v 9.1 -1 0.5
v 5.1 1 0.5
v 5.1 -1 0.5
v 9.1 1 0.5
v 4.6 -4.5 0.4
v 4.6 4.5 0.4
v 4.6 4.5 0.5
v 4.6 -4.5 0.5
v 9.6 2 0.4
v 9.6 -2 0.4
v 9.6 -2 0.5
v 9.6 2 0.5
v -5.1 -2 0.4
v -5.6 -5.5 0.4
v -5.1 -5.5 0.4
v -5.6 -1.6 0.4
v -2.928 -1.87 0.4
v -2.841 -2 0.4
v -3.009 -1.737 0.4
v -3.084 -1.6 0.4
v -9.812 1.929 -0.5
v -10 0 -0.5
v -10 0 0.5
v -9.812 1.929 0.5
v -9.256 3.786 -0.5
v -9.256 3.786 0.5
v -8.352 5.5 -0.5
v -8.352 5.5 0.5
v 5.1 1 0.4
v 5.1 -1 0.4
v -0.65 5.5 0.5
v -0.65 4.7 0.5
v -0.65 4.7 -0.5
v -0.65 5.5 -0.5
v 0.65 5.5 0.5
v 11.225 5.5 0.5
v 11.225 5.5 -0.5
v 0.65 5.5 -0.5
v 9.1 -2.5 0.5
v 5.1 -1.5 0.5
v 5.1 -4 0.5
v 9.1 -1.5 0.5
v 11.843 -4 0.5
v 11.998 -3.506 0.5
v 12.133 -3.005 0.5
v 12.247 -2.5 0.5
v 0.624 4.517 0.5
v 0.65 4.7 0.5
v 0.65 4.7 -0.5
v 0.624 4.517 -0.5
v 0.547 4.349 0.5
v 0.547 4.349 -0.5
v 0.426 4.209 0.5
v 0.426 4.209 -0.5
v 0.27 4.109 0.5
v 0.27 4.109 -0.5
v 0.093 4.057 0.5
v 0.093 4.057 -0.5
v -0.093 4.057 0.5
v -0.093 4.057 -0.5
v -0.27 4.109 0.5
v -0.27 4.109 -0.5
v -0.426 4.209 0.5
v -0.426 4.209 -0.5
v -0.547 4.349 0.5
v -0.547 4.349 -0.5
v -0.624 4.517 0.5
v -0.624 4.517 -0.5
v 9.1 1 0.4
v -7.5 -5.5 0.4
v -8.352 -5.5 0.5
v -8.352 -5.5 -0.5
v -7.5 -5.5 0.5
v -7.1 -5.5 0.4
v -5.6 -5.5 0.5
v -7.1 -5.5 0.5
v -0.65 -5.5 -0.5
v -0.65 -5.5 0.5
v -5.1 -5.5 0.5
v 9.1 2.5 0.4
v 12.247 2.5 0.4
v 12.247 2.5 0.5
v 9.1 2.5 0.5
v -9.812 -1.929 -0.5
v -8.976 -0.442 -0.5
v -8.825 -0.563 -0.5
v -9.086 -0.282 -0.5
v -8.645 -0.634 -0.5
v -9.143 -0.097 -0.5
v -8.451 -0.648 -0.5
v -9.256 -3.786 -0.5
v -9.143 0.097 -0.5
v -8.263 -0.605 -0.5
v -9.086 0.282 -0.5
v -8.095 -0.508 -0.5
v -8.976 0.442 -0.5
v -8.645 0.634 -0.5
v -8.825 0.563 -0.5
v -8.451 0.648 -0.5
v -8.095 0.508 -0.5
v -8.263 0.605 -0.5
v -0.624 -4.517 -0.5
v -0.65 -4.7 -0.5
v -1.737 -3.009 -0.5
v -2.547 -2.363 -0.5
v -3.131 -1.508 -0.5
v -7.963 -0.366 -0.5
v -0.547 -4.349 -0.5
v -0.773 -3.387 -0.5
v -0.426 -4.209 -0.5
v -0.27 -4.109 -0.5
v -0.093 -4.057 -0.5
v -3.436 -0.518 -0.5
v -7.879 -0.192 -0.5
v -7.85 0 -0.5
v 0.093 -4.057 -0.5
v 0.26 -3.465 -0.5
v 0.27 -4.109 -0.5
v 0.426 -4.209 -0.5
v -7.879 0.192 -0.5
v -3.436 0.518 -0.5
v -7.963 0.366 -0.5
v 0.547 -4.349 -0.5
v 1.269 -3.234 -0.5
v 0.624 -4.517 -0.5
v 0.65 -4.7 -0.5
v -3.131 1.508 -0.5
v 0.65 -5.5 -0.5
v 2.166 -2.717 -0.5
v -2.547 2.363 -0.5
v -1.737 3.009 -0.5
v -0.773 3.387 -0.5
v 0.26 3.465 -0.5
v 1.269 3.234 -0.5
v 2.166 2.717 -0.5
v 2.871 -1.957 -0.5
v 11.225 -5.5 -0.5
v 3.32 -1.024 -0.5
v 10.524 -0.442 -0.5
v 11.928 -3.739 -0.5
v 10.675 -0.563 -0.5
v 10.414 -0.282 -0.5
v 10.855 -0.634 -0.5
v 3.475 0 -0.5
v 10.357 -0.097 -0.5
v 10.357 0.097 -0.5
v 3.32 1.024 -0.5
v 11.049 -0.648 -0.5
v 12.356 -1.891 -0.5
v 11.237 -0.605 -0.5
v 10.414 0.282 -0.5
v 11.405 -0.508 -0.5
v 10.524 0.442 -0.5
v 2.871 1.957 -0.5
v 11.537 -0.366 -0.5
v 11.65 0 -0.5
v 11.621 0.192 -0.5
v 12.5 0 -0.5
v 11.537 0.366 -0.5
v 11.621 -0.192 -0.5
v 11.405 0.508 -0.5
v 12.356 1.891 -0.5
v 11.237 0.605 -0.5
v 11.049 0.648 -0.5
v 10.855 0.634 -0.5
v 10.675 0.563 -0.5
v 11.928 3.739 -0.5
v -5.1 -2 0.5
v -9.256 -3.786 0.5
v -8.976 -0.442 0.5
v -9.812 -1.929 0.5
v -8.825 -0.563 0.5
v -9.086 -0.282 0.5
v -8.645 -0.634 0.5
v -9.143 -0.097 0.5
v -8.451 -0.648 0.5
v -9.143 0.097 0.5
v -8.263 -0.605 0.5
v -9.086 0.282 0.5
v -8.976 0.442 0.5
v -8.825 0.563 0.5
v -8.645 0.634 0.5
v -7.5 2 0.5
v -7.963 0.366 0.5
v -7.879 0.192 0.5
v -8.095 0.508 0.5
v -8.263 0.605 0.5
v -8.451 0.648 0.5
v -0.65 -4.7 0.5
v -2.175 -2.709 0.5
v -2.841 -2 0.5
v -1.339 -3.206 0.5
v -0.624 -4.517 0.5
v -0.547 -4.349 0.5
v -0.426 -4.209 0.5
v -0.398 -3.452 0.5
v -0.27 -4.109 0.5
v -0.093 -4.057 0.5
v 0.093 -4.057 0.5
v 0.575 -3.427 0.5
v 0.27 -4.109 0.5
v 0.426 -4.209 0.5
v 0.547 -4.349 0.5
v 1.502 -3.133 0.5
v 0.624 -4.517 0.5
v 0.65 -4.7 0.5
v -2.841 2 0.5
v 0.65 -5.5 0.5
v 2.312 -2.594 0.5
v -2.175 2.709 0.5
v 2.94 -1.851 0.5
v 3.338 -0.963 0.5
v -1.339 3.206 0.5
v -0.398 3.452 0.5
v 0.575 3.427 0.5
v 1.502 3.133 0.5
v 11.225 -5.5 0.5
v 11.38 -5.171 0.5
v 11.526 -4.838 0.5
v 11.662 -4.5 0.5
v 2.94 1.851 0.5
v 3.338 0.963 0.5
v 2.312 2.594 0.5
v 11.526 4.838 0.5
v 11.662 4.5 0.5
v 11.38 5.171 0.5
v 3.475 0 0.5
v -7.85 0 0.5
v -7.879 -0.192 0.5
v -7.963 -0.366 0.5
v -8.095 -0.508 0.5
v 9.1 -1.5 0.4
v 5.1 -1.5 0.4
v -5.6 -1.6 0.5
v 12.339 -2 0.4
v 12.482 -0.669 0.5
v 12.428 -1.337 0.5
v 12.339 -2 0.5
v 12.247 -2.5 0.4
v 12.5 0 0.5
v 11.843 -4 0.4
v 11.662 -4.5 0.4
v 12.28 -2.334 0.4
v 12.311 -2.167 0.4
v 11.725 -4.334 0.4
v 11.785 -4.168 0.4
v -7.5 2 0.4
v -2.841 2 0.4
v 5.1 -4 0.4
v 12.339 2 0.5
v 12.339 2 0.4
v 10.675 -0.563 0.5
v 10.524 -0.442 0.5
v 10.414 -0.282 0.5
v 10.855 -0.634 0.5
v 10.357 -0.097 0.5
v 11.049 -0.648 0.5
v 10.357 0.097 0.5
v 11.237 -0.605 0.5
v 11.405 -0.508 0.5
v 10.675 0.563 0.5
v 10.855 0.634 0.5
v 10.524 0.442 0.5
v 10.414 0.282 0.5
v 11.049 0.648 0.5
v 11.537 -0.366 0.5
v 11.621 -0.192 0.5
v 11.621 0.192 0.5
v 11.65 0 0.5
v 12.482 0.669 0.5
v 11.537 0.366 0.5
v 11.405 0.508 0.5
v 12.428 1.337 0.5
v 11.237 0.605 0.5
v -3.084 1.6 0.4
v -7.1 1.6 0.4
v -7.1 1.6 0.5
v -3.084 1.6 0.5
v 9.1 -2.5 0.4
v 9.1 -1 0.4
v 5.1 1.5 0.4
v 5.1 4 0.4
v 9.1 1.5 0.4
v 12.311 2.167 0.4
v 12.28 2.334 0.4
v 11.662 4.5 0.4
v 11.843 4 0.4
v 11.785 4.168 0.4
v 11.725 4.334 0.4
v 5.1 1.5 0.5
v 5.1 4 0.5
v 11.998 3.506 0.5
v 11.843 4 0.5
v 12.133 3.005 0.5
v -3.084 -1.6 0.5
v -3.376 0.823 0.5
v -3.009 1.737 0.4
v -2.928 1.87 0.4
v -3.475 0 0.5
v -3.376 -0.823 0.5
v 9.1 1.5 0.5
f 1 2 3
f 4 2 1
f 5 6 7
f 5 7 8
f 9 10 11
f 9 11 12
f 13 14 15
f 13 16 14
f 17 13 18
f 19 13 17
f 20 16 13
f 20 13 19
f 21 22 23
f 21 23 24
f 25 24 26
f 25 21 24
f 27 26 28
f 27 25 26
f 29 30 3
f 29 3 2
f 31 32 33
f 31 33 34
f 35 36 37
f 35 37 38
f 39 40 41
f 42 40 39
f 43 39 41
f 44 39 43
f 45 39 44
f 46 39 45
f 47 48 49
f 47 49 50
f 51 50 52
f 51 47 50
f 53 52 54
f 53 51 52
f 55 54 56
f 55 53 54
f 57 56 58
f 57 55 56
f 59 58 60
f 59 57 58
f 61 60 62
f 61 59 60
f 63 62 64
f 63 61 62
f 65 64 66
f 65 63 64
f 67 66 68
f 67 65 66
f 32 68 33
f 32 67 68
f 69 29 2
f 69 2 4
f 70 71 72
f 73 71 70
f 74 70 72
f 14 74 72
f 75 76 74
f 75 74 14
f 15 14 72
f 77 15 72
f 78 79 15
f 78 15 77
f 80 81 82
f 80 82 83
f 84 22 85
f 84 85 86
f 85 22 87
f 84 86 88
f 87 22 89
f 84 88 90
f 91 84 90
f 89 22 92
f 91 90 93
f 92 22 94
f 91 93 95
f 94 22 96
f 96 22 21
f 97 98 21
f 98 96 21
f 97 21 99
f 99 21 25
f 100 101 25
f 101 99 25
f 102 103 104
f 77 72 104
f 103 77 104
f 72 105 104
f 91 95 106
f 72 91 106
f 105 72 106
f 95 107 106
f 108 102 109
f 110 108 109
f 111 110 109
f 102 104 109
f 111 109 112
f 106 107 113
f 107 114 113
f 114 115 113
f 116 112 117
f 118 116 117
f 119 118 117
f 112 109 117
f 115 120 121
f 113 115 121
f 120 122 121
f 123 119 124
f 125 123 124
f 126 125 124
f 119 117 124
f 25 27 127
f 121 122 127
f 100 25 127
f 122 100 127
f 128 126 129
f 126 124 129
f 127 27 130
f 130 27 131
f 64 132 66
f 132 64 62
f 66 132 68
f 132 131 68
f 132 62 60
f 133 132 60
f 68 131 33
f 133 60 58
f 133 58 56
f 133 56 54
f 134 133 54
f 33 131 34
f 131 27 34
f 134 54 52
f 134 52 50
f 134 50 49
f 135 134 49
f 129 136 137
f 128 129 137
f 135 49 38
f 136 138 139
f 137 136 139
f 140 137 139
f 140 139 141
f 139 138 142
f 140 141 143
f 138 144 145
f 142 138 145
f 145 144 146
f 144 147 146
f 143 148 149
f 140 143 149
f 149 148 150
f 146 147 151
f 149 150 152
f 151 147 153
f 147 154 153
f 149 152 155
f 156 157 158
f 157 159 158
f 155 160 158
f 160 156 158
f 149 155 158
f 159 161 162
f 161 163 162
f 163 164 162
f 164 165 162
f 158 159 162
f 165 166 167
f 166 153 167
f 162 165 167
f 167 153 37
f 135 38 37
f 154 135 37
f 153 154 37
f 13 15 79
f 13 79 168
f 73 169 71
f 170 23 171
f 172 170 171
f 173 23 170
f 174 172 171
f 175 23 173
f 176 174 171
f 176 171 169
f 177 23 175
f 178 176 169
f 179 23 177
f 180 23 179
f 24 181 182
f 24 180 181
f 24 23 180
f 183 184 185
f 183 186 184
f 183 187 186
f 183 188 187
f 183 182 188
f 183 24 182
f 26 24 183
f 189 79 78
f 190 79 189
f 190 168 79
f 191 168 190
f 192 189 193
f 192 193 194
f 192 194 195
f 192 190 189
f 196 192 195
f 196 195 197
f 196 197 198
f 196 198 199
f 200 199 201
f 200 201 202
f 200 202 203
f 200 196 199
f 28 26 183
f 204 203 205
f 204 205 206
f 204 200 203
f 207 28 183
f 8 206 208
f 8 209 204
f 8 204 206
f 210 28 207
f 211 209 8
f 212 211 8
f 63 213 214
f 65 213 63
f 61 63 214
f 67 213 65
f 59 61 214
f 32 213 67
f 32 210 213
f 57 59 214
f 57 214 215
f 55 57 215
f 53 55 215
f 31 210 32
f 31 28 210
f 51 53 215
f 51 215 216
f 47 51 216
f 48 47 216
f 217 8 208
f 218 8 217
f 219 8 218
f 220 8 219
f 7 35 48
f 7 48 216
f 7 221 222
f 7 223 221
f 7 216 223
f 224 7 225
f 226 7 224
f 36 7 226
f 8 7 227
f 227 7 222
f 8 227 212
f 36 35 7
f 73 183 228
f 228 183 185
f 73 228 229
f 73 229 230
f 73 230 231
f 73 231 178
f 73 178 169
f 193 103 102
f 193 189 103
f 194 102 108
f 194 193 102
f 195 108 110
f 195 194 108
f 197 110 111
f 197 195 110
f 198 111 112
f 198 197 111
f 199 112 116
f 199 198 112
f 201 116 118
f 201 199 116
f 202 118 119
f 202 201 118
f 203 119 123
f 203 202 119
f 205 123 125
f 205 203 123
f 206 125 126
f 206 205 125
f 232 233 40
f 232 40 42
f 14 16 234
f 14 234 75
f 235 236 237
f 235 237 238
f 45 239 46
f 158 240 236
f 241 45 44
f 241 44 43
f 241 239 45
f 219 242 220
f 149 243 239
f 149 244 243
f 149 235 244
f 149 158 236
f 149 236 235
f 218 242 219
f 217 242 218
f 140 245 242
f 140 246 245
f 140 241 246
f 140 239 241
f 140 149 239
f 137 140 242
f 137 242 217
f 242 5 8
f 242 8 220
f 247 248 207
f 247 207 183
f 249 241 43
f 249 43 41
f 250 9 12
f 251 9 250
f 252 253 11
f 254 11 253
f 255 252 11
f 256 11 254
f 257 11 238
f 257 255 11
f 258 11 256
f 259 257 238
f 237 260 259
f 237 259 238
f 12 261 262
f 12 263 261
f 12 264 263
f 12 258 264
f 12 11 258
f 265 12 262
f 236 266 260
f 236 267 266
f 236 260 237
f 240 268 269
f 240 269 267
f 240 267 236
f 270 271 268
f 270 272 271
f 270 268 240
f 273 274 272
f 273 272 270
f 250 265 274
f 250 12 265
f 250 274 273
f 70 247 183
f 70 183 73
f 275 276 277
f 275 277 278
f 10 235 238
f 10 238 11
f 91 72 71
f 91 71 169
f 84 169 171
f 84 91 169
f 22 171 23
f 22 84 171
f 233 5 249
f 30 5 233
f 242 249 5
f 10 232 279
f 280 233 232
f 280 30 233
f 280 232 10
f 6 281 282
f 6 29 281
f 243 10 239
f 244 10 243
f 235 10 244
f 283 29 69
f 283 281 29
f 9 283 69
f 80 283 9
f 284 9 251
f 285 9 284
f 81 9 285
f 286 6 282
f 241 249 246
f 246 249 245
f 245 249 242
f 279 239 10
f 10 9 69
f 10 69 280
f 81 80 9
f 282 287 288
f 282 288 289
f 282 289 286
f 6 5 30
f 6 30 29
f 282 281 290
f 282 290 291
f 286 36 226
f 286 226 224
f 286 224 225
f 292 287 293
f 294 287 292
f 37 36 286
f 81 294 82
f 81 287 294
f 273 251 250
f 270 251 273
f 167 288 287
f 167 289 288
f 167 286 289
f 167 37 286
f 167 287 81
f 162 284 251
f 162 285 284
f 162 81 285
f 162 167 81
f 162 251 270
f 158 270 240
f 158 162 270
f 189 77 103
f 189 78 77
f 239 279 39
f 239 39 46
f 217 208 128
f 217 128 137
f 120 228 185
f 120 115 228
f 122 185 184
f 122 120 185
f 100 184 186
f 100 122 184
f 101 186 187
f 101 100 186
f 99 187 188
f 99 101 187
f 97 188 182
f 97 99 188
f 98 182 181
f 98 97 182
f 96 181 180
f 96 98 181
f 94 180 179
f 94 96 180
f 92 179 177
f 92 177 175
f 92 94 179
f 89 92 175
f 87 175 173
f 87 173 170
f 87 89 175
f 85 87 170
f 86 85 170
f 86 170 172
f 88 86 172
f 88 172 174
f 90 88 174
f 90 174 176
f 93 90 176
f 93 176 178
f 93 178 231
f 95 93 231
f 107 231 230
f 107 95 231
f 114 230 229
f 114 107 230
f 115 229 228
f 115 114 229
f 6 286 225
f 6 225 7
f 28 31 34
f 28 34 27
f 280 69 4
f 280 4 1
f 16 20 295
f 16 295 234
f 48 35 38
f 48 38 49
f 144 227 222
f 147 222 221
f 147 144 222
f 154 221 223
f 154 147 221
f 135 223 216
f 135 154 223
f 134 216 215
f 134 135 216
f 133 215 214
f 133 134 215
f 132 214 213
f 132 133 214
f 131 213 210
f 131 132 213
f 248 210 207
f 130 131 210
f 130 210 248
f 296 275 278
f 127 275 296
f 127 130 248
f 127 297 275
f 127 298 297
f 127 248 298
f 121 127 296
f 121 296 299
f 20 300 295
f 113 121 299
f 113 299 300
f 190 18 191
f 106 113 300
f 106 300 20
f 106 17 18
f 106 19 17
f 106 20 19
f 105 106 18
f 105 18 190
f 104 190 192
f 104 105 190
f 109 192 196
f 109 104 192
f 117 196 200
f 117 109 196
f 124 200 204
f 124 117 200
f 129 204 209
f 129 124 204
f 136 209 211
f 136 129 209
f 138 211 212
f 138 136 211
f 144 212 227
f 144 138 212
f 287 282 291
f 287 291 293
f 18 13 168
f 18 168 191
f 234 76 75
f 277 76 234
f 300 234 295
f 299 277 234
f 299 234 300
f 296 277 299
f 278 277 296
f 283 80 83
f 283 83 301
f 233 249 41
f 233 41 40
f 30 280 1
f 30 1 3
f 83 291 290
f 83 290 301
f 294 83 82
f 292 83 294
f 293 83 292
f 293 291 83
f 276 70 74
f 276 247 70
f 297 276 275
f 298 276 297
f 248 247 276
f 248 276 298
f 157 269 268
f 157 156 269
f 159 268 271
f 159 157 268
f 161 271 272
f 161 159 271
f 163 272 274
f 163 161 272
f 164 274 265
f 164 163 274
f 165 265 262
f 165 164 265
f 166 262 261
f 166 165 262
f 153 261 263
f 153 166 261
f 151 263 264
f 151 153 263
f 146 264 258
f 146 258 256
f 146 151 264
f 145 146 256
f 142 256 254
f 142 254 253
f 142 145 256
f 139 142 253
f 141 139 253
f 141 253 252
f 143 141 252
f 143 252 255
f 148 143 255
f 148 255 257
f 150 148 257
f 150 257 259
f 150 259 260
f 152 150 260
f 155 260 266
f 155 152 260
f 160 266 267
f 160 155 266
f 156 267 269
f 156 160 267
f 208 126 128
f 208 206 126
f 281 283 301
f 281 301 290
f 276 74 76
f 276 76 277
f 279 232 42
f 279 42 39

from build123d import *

# Parameters (mm, degrees)
MODEL_R         = 0.65
MODEL_R_2       = 3.4746057
EXTRUDE_1_DEPTH = 0.5
EXTRUDE1_START  = -0.5
EXTRUDE1_DEPTH  = 1
EXTRUDE2_START  = -0.1
EXTRUDE2_DEPTH  = 0.1


# Read off the part's stored shape, not the designer's step: Extrude1
with BuildPart() as part:
    # Model → Бобышка-Вытянуть1 (new, symmetric)
    with BuildSketch(Plane.XY):
        with BuildLine():
            Line((0.65, -4.7), (0.65, -5.5))
            Line((0.65, -5.5), (12.5, -5.5))
            Line((12.5, -5.5), (12.5, 5.5))
            Line((12.5, 5.5), (0.65, 5.5))
            Line((0.65, 5.5), (0.65, 4.7))
            ThreePointArc((0.65, 4.7), (0, 4.05), (-0.65, 4.7))
            Line((-0.65, 4.7), (-0.65, 5.5))
            Line((-0.65, 5.5), (-10, 5.5))
            Line((-10, 5.5), (-10, -5.5))
            Line((-10, -5.5), (-0.65, -5.5))
            Line((-0.65, -5.5), (-0.65, -4.7))
            ThreePointArc((-0.65, -4.7), (0, -4.05), (0.65, -4.7))
        make_face()
        with Locations((-8.5, 0)):
            Circle(MODEL_R, mode=Mode.SUBTRACT)
        Circle(MODEL_R_2, mode=Mode.SUBTRACT)
        with Locations((11, 0)):
            Circle(MODEL_R, mode=Mode.SUBTRACT)
    extrude(amount=EXTRUDE_1_DEPTH, both=True)

    # Extrude1 outline → Extrude1 (cut)
    with BuildSketch(Plane.XY.offset(EXTRUDE1_START)):
        with BuildLine():
            ThreePointArc((11.22497216, 5.5), (12.177071733, 2.822928267), (12.5, 0))
            Line((12.5, 0), (12.5, 5.5))
            Line((12.5, 5.5), (11.22497216, 5.5))
        make_face()
        with BuildLine():
            ThreePointArc((12.5, 0), (12.177071733, -2.822928267), (11.22497216, -5.5))
            Line((11.22497216, -5.5), (12.5, -5.5))
            Line((12.5, -5.5), (12.5, 0))
        make_face()
        with BuildLine():
            ThreePointArc((-8.351646544, -5.5), (-9.579051769, -2.87084782), (-10, 2.7e-08))
            Line((-10, 2.7e-08), (-10, -5.5))
            Line((-10, -5.5), (-8.351646544, -5.5))
        make_face()
        with BuildLine():
            ThreePointArc((-10, 2.7e-08), (-9.579051761, 2.870847846), (-8.351646544, 5.5))
            Line((-8.351646544, 5.5), (-10, 5.5))
            Line((-10, 5.5), (-10, 2.7e-08))
        make_face()
    extrude(amount=EXTRUDE1_DEPTH, mode=Mode.SUBTRACT)

    # Sketch2 → Extrude2 (cut)
    # profile 1 of 3: a face of its own
    with BuildSketch(Plane.XY.offset(0.5).offset(EXTRUDE2_START)):
        with BuildLine():
            Line((-5.6, -5.5), (-5.1, -5.5))
            Line((-5.1, -5.5), (-5.1, -2))
            Line((-5.1, -2), (-3.7, -2))
            Line((-3.7, -2), (-2.841282241, -2))
            ThreePointArc((-2.841282241, -2), (-2.969532083, -1.804096444), (-3.084296479, -1.6))
            Line((-3.084296479, -1.6), (-4.1, -1.6))
            Line((-4.1, -1.6), (-5.6, -1.6))
            Line((-5.6, -1.6), (-5.6, -5.5))
        make_face()
    # profile 2 of 3: a face of its own
    with BuildSketch(Plane.XY.offset(0.5).offset(EXTRUDE2_START)):
        with BuildLine():
            Line((-7.5, -5.5), (-7.1, -5.5))
            Line((-7.1, -5.5), (-7.1, -1.6))
            Line((-7.1, -1.6), (-7.1, 1.6))
            Line((-7.1, 1.6), (-4.1, 1.6))
            Line((-4.1, 1.6), (-3.084296479, 1.6))
            ThreePointArc((-3.084296479, 1.6), (-2.969532083, 1.804096444), (-2.841282241, 2))
            Line((-2.841282241, 2), (-3.7, 2))
            Line((-3.7, 2), (-7.5, 2))
            Line((-7.5, 2), (-7.5, -2))
            Line((-7.5, -2), (-7.5, -5.5))
        make_face()
    # profile 3 of 3: a face of its own
    with BuildSketch(Plane.XY.offset(0.5).offset(EXTRUDE2_START)):
        with BuildLine():
            Line((4.6, -4.5), (11.66190379, -4.5))
            ThreePointArc((11.66190379, -4.5), (11.754970287, -4.250961487), (11.842719282, -4))
            Line((11.842719282, -4), (9.1, -4))
            Line((9.1, -4), (5.1, -4))
            Line((5.1, -4), (5.1, -1.5))
            Line((5.1, -1.5), (6.1, -1.5))
            Line((6.1, -1.5), (9.1, -1.5))
            Line((9.1, -1.5), (9.1, -2.5))
            Line((9.1, -2.5), (12.247448714, -2.5))
            ThreePointArc((12.247448714, -2.5), (12.295747488, -2.250465219), (12.338962679, -2))
            Line((12.338962679, -2), (9.6, -2))
            Line((9.6, -2), (9.6, -1.5))
            Line((9.6, -1.5), (9.6, 1.5))
            Line((9.6, 1.5), (9.6, 2))
            Line((9.6, 2), (12.338962679, 2))
            ThreePointArc((12.338962679, 2), (12.295747488, 2.250465219), (12.247448714, 2.5))
            Line((12.247448714, 2.5), (9.1, 2.5))
            Line((9.1, 2.5), (9.1, 1.5))
            Line((9.1, 1.5), (6.1, 1.5))
            Line((6.1, 1.5), (5.1, 1.5))
            Line((5.1, 1.5), (5.1, 4))
            Line((5.1, 4), (9.1, 4))
            Line((9.1, 4), (11.842719282, 4))
            ThreePointArc((11.842719282, 4), (11.754970287, 4.250961487), (11.66190379, 4.5))
            Line((11.66190379, 4.5), (4.6, 4.5))
            Line((4.6, 4.5), (4.6, 4))
            Line((4.6, 4), (4.6, 1.5))
            Line((4.6, 1.5), (4.6, -1.5))
            Line((4.6, -1.5), (4.6, -4))
            Line((4.6, -4), (4.6, -4.5))
        make_face()
        Polygon((9.1, 1), (9.1, -1), (6.1, -1), (5.1, -1), (5.1, 0.813952094), (5.1, 1), (6.1, 1), align=None, mode=Mode.SUBTRACT)
    extrude(amount=EXTRUDE2_DEPTH, mode=Mode.SUBTRACT)


solid = part.part
